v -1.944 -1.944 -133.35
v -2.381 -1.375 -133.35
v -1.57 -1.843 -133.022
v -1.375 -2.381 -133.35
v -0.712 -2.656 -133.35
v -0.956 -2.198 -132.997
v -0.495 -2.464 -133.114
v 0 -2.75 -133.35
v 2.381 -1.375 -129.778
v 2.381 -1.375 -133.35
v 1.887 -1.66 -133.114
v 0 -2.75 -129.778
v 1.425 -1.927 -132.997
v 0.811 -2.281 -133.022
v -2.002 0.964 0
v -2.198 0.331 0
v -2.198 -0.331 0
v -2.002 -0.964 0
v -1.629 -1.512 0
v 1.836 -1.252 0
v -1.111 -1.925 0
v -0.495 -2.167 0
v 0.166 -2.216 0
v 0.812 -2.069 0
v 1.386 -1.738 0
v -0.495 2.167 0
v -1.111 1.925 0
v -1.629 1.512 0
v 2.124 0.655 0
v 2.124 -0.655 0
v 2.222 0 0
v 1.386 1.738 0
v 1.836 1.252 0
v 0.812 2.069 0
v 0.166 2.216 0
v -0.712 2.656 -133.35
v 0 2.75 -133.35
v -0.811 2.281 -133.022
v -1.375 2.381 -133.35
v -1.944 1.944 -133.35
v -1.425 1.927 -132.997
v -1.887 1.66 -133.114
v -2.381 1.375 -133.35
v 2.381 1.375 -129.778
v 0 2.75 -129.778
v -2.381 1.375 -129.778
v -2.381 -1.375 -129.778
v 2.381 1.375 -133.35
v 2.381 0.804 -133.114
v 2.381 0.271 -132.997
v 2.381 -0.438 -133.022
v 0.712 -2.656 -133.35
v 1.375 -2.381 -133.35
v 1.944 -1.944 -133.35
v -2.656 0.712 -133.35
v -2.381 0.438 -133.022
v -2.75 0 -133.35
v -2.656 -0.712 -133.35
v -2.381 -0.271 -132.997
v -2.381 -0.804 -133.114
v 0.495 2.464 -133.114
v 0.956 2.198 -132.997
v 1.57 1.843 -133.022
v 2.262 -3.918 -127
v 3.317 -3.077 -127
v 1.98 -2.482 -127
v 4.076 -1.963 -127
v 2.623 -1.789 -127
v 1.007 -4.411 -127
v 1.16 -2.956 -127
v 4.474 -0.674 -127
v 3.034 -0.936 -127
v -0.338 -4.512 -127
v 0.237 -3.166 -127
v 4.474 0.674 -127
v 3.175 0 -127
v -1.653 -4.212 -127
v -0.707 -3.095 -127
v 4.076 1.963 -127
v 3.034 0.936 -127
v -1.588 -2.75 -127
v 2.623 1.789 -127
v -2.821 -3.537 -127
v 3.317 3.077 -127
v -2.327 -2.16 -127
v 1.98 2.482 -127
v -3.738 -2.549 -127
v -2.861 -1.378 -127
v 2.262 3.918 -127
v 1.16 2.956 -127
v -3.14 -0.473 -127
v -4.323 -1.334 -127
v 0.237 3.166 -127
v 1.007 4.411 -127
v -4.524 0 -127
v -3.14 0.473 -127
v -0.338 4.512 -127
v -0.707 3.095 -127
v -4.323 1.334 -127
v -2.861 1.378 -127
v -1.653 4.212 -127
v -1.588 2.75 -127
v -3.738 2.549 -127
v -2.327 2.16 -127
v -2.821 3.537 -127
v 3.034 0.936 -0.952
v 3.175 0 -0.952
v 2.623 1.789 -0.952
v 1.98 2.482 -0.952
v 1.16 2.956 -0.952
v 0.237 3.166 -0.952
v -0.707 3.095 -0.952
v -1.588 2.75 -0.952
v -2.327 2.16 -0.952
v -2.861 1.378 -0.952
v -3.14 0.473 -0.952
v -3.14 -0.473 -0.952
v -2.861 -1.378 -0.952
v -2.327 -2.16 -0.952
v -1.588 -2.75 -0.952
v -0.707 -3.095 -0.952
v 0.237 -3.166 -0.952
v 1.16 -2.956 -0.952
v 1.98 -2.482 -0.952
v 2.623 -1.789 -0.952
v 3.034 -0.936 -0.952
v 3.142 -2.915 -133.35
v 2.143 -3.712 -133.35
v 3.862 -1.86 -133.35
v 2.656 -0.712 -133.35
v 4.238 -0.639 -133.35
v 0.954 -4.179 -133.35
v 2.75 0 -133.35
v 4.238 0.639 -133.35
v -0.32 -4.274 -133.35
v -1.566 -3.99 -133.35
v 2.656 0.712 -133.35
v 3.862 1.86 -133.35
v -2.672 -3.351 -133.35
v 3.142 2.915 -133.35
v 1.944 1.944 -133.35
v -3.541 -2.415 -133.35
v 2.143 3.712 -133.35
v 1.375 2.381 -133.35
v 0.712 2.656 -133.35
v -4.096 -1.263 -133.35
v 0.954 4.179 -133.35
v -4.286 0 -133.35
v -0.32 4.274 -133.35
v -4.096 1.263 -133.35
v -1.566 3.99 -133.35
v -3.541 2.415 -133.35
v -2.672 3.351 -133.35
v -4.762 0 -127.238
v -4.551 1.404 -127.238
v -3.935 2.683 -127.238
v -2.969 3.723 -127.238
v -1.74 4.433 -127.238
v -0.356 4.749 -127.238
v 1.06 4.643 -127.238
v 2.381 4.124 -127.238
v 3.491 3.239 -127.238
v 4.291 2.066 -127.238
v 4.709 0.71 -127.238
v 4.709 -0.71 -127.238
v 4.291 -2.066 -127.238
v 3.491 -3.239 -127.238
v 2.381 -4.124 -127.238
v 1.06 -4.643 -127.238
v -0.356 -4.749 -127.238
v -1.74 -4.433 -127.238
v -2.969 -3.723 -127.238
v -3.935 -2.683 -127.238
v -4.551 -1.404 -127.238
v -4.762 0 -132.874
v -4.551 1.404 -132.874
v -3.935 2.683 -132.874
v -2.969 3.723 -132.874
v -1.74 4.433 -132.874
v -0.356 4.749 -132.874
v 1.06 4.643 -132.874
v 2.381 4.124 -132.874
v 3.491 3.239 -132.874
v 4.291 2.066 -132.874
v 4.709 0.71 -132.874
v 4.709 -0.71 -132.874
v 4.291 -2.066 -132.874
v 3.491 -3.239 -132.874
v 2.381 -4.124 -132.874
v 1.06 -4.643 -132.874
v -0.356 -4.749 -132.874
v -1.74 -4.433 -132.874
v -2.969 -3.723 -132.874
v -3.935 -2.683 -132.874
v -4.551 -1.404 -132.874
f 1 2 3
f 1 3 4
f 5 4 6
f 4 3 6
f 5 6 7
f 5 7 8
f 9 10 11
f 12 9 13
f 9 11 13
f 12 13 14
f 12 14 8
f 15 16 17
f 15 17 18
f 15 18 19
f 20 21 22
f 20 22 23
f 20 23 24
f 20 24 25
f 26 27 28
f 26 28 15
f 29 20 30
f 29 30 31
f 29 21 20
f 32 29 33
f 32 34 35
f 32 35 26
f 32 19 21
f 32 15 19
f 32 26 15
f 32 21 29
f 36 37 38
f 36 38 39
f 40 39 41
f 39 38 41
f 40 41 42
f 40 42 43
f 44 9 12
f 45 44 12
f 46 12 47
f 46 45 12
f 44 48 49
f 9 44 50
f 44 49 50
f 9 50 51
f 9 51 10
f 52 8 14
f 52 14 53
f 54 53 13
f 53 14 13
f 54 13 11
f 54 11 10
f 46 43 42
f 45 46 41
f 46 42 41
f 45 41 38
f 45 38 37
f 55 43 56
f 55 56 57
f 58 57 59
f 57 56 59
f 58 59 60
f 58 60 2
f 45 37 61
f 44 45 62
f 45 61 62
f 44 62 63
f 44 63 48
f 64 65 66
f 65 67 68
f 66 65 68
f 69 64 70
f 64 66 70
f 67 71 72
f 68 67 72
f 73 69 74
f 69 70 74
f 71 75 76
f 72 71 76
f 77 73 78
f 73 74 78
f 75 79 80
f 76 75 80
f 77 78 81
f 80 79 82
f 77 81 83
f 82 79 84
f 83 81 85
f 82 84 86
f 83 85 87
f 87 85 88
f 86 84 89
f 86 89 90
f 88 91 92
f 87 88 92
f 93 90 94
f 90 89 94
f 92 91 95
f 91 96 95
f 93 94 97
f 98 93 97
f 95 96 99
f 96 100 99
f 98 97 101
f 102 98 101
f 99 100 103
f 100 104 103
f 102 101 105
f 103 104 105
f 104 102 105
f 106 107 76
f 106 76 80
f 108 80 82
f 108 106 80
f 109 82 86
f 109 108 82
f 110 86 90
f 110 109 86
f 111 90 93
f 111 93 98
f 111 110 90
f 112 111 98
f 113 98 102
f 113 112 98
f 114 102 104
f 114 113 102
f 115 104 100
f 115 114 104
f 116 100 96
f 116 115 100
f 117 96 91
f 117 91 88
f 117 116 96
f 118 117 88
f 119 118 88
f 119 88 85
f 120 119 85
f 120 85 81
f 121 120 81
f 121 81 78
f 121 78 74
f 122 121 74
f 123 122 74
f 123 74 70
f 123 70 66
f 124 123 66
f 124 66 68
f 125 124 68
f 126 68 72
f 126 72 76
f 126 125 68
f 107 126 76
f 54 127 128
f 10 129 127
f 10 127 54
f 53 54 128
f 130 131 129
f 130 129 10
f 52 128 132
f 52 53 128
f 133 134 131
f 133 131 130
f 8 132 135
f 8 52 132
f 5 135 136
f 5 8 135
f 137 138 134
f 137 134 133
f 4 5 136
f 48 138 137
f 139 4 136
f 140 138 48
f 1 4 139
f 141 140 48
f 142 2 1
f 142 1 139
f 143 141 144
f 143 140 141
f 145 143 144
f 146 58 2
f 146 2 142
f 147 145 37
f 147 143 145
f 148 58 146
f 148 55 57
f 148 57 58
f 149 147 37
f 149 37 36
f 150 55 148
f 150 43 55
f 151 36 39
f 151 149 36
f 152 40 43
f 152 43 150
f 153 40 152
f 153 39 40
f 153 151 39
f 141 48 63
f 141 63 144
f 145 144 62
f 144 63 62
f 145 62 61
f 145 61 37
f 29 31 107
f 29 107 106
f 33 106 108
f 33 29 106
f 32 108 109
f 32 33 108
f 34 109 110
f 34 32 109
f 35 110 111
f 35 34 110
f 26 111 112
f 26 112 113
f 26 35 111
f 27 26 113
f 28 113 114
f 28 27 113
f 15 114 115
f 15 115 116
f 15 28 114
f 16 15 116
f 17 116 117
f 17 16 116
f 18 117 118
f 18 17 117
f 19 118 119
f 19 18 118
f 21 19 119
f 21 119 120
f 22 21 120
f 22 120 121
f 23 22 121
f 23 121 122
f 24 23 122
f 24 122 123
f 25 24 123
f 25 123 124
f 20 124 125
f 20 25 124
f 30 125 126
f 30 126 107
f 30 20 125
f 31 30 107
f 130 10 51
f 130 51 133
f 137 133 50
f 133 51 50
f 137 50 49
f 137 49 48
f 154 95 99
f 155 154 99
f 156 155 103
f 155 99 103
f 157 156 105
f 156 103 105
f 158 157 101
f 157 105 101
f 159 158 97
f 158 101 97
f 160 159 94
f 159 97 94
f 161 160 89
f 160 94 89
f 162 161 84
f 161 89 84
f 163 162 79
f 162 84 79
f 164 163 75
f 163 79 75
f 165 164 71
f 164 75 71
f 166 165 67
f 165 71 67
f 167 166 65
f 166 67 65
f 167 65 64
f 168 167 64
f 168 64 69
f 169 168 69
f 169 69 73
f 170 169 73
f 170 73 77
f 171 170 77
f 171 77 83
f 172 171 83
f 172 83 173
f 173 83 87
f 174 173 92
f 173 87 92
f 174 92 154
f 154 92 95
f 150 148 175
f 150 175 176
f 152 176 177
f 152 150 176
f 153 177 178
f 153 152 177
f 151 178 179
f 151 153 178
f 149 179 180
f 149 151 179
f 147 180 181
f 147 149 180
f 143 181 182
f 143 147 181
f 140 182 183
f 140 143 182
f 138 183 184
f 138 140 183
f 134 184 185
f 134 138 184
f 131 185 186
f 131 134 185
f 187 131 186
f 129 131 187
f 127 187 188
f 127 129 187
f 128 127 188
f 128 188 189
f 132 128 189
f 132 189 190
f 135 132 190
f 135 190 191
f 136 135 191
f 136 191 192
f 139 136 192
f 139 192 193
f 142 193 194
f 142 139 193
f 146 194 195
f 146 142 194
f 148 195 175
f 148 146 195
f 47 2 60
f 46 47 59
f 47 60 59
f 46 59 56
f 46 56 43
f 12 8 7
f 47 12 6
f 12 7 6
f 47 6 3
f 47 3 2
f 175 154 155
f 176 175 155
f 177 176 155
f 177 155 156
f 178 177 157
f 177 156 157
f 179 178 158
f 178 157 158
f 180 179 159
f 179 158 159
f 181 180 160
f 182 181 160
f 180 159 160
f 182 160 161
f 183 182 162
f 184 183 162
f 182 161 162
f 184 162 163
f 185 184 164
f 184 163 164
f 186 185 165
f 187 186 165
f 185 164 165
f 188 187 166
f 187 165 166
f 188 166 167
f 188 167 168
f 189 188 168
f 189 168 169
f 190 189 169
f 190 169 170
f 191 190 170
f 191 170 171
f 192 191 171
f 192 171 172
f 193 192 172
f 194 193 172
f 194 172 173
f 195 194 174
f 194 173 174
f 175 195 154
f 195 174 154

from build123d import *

# Parameters (mm, degrees)
SKETCH1_R          = 3.175
EXTRUDE1_DEPTH     = 127
CHAMFER3_SIZE      = 0.9525
SKETCH6_R          = 4.7625
EXTRUDE2_DEPTH     = 6.35
CUT_EXTRUDE1_DEPTH = 3.571875
CHAMFER1_SIZE      = 0.47625
CHAMFER2_SIZE      = 0.238125


with BuildPart() as part:
    # Sketch1 → Extrude1 (new body)
    with BuildSketch(Plane.XY):
        Circle(SKETCH1_R)
    extrude(amount=-EXTRUDE1_DEPTH)

    # Chamfer3
    chamfer3_edges = [part.edges().sort_by_distance(p)[0] for p in [
        (-3.175, 0, 0),
    ]]
    chamfer(chamfer3_edges, length=CHAMFER3_SIZE)

    # Sketch6 → Extrude2 (add)
    with BuildSketch(Plane(origin=(0, 0, -127), x_dir=(-1, 0, 0), z_dir=(0, 0, -1))):
        Circle(SKETCH6_R)
    extrude(amount=EXTRUDE2_DEPTH)

    # Sketch7 → Cut-Extrude1 (cut)
    with BuildSketch(Plane(origin=(0, 0, -133.35), x_dir=(-1, 0, 0), z_dir=(0, 0, -1))):
        Polygon((0, 2.749630657), (-2.38125, 1.374815329), (-2.38125, -1.374815329), (0, -2.749630657), (2.38125, -1.374815329), (2.38125, 1.374815329), align=None)
    extrude(amount=-CUT_EXTRUDE1_DEPTH, mode=Mode.SUBTRACT)

    # Cut-Extrude2 cone 1 section (through the dimple's axis) → Cut-Extrude2 (revolve, cut)
    with BuildSketch(Plane(origin=(0, 0, -133.35), x_dir=(0, 1, 0), z_dir=(1, 0, 0))):
        Polygon((0, 0), (2.749630657, 0), (0, 2.749630657), align=None)
    revolve(axis=Axis((0, 0, -133.35), (0, 0, 1)), mode=Mode.SUBTRACT)

    # Chamfer1
    chamfer1_edges = [part.edges().sort_by_distance(p)[0] for p in [
        (4.7625, 0, -133.35),
    ]]
    chamfer(chamfer1_edges, length=CHAMFER1_SIZE)

    # Chamfer2
    chamfer2_edges = [part.edges().sort_by_distance(p)[0] for p in [
        (4.7625, 0, -127),
    ]]
    chamfer(chamfer2_edges, length=CHAMFER2_SIZE)


solid = part.part
